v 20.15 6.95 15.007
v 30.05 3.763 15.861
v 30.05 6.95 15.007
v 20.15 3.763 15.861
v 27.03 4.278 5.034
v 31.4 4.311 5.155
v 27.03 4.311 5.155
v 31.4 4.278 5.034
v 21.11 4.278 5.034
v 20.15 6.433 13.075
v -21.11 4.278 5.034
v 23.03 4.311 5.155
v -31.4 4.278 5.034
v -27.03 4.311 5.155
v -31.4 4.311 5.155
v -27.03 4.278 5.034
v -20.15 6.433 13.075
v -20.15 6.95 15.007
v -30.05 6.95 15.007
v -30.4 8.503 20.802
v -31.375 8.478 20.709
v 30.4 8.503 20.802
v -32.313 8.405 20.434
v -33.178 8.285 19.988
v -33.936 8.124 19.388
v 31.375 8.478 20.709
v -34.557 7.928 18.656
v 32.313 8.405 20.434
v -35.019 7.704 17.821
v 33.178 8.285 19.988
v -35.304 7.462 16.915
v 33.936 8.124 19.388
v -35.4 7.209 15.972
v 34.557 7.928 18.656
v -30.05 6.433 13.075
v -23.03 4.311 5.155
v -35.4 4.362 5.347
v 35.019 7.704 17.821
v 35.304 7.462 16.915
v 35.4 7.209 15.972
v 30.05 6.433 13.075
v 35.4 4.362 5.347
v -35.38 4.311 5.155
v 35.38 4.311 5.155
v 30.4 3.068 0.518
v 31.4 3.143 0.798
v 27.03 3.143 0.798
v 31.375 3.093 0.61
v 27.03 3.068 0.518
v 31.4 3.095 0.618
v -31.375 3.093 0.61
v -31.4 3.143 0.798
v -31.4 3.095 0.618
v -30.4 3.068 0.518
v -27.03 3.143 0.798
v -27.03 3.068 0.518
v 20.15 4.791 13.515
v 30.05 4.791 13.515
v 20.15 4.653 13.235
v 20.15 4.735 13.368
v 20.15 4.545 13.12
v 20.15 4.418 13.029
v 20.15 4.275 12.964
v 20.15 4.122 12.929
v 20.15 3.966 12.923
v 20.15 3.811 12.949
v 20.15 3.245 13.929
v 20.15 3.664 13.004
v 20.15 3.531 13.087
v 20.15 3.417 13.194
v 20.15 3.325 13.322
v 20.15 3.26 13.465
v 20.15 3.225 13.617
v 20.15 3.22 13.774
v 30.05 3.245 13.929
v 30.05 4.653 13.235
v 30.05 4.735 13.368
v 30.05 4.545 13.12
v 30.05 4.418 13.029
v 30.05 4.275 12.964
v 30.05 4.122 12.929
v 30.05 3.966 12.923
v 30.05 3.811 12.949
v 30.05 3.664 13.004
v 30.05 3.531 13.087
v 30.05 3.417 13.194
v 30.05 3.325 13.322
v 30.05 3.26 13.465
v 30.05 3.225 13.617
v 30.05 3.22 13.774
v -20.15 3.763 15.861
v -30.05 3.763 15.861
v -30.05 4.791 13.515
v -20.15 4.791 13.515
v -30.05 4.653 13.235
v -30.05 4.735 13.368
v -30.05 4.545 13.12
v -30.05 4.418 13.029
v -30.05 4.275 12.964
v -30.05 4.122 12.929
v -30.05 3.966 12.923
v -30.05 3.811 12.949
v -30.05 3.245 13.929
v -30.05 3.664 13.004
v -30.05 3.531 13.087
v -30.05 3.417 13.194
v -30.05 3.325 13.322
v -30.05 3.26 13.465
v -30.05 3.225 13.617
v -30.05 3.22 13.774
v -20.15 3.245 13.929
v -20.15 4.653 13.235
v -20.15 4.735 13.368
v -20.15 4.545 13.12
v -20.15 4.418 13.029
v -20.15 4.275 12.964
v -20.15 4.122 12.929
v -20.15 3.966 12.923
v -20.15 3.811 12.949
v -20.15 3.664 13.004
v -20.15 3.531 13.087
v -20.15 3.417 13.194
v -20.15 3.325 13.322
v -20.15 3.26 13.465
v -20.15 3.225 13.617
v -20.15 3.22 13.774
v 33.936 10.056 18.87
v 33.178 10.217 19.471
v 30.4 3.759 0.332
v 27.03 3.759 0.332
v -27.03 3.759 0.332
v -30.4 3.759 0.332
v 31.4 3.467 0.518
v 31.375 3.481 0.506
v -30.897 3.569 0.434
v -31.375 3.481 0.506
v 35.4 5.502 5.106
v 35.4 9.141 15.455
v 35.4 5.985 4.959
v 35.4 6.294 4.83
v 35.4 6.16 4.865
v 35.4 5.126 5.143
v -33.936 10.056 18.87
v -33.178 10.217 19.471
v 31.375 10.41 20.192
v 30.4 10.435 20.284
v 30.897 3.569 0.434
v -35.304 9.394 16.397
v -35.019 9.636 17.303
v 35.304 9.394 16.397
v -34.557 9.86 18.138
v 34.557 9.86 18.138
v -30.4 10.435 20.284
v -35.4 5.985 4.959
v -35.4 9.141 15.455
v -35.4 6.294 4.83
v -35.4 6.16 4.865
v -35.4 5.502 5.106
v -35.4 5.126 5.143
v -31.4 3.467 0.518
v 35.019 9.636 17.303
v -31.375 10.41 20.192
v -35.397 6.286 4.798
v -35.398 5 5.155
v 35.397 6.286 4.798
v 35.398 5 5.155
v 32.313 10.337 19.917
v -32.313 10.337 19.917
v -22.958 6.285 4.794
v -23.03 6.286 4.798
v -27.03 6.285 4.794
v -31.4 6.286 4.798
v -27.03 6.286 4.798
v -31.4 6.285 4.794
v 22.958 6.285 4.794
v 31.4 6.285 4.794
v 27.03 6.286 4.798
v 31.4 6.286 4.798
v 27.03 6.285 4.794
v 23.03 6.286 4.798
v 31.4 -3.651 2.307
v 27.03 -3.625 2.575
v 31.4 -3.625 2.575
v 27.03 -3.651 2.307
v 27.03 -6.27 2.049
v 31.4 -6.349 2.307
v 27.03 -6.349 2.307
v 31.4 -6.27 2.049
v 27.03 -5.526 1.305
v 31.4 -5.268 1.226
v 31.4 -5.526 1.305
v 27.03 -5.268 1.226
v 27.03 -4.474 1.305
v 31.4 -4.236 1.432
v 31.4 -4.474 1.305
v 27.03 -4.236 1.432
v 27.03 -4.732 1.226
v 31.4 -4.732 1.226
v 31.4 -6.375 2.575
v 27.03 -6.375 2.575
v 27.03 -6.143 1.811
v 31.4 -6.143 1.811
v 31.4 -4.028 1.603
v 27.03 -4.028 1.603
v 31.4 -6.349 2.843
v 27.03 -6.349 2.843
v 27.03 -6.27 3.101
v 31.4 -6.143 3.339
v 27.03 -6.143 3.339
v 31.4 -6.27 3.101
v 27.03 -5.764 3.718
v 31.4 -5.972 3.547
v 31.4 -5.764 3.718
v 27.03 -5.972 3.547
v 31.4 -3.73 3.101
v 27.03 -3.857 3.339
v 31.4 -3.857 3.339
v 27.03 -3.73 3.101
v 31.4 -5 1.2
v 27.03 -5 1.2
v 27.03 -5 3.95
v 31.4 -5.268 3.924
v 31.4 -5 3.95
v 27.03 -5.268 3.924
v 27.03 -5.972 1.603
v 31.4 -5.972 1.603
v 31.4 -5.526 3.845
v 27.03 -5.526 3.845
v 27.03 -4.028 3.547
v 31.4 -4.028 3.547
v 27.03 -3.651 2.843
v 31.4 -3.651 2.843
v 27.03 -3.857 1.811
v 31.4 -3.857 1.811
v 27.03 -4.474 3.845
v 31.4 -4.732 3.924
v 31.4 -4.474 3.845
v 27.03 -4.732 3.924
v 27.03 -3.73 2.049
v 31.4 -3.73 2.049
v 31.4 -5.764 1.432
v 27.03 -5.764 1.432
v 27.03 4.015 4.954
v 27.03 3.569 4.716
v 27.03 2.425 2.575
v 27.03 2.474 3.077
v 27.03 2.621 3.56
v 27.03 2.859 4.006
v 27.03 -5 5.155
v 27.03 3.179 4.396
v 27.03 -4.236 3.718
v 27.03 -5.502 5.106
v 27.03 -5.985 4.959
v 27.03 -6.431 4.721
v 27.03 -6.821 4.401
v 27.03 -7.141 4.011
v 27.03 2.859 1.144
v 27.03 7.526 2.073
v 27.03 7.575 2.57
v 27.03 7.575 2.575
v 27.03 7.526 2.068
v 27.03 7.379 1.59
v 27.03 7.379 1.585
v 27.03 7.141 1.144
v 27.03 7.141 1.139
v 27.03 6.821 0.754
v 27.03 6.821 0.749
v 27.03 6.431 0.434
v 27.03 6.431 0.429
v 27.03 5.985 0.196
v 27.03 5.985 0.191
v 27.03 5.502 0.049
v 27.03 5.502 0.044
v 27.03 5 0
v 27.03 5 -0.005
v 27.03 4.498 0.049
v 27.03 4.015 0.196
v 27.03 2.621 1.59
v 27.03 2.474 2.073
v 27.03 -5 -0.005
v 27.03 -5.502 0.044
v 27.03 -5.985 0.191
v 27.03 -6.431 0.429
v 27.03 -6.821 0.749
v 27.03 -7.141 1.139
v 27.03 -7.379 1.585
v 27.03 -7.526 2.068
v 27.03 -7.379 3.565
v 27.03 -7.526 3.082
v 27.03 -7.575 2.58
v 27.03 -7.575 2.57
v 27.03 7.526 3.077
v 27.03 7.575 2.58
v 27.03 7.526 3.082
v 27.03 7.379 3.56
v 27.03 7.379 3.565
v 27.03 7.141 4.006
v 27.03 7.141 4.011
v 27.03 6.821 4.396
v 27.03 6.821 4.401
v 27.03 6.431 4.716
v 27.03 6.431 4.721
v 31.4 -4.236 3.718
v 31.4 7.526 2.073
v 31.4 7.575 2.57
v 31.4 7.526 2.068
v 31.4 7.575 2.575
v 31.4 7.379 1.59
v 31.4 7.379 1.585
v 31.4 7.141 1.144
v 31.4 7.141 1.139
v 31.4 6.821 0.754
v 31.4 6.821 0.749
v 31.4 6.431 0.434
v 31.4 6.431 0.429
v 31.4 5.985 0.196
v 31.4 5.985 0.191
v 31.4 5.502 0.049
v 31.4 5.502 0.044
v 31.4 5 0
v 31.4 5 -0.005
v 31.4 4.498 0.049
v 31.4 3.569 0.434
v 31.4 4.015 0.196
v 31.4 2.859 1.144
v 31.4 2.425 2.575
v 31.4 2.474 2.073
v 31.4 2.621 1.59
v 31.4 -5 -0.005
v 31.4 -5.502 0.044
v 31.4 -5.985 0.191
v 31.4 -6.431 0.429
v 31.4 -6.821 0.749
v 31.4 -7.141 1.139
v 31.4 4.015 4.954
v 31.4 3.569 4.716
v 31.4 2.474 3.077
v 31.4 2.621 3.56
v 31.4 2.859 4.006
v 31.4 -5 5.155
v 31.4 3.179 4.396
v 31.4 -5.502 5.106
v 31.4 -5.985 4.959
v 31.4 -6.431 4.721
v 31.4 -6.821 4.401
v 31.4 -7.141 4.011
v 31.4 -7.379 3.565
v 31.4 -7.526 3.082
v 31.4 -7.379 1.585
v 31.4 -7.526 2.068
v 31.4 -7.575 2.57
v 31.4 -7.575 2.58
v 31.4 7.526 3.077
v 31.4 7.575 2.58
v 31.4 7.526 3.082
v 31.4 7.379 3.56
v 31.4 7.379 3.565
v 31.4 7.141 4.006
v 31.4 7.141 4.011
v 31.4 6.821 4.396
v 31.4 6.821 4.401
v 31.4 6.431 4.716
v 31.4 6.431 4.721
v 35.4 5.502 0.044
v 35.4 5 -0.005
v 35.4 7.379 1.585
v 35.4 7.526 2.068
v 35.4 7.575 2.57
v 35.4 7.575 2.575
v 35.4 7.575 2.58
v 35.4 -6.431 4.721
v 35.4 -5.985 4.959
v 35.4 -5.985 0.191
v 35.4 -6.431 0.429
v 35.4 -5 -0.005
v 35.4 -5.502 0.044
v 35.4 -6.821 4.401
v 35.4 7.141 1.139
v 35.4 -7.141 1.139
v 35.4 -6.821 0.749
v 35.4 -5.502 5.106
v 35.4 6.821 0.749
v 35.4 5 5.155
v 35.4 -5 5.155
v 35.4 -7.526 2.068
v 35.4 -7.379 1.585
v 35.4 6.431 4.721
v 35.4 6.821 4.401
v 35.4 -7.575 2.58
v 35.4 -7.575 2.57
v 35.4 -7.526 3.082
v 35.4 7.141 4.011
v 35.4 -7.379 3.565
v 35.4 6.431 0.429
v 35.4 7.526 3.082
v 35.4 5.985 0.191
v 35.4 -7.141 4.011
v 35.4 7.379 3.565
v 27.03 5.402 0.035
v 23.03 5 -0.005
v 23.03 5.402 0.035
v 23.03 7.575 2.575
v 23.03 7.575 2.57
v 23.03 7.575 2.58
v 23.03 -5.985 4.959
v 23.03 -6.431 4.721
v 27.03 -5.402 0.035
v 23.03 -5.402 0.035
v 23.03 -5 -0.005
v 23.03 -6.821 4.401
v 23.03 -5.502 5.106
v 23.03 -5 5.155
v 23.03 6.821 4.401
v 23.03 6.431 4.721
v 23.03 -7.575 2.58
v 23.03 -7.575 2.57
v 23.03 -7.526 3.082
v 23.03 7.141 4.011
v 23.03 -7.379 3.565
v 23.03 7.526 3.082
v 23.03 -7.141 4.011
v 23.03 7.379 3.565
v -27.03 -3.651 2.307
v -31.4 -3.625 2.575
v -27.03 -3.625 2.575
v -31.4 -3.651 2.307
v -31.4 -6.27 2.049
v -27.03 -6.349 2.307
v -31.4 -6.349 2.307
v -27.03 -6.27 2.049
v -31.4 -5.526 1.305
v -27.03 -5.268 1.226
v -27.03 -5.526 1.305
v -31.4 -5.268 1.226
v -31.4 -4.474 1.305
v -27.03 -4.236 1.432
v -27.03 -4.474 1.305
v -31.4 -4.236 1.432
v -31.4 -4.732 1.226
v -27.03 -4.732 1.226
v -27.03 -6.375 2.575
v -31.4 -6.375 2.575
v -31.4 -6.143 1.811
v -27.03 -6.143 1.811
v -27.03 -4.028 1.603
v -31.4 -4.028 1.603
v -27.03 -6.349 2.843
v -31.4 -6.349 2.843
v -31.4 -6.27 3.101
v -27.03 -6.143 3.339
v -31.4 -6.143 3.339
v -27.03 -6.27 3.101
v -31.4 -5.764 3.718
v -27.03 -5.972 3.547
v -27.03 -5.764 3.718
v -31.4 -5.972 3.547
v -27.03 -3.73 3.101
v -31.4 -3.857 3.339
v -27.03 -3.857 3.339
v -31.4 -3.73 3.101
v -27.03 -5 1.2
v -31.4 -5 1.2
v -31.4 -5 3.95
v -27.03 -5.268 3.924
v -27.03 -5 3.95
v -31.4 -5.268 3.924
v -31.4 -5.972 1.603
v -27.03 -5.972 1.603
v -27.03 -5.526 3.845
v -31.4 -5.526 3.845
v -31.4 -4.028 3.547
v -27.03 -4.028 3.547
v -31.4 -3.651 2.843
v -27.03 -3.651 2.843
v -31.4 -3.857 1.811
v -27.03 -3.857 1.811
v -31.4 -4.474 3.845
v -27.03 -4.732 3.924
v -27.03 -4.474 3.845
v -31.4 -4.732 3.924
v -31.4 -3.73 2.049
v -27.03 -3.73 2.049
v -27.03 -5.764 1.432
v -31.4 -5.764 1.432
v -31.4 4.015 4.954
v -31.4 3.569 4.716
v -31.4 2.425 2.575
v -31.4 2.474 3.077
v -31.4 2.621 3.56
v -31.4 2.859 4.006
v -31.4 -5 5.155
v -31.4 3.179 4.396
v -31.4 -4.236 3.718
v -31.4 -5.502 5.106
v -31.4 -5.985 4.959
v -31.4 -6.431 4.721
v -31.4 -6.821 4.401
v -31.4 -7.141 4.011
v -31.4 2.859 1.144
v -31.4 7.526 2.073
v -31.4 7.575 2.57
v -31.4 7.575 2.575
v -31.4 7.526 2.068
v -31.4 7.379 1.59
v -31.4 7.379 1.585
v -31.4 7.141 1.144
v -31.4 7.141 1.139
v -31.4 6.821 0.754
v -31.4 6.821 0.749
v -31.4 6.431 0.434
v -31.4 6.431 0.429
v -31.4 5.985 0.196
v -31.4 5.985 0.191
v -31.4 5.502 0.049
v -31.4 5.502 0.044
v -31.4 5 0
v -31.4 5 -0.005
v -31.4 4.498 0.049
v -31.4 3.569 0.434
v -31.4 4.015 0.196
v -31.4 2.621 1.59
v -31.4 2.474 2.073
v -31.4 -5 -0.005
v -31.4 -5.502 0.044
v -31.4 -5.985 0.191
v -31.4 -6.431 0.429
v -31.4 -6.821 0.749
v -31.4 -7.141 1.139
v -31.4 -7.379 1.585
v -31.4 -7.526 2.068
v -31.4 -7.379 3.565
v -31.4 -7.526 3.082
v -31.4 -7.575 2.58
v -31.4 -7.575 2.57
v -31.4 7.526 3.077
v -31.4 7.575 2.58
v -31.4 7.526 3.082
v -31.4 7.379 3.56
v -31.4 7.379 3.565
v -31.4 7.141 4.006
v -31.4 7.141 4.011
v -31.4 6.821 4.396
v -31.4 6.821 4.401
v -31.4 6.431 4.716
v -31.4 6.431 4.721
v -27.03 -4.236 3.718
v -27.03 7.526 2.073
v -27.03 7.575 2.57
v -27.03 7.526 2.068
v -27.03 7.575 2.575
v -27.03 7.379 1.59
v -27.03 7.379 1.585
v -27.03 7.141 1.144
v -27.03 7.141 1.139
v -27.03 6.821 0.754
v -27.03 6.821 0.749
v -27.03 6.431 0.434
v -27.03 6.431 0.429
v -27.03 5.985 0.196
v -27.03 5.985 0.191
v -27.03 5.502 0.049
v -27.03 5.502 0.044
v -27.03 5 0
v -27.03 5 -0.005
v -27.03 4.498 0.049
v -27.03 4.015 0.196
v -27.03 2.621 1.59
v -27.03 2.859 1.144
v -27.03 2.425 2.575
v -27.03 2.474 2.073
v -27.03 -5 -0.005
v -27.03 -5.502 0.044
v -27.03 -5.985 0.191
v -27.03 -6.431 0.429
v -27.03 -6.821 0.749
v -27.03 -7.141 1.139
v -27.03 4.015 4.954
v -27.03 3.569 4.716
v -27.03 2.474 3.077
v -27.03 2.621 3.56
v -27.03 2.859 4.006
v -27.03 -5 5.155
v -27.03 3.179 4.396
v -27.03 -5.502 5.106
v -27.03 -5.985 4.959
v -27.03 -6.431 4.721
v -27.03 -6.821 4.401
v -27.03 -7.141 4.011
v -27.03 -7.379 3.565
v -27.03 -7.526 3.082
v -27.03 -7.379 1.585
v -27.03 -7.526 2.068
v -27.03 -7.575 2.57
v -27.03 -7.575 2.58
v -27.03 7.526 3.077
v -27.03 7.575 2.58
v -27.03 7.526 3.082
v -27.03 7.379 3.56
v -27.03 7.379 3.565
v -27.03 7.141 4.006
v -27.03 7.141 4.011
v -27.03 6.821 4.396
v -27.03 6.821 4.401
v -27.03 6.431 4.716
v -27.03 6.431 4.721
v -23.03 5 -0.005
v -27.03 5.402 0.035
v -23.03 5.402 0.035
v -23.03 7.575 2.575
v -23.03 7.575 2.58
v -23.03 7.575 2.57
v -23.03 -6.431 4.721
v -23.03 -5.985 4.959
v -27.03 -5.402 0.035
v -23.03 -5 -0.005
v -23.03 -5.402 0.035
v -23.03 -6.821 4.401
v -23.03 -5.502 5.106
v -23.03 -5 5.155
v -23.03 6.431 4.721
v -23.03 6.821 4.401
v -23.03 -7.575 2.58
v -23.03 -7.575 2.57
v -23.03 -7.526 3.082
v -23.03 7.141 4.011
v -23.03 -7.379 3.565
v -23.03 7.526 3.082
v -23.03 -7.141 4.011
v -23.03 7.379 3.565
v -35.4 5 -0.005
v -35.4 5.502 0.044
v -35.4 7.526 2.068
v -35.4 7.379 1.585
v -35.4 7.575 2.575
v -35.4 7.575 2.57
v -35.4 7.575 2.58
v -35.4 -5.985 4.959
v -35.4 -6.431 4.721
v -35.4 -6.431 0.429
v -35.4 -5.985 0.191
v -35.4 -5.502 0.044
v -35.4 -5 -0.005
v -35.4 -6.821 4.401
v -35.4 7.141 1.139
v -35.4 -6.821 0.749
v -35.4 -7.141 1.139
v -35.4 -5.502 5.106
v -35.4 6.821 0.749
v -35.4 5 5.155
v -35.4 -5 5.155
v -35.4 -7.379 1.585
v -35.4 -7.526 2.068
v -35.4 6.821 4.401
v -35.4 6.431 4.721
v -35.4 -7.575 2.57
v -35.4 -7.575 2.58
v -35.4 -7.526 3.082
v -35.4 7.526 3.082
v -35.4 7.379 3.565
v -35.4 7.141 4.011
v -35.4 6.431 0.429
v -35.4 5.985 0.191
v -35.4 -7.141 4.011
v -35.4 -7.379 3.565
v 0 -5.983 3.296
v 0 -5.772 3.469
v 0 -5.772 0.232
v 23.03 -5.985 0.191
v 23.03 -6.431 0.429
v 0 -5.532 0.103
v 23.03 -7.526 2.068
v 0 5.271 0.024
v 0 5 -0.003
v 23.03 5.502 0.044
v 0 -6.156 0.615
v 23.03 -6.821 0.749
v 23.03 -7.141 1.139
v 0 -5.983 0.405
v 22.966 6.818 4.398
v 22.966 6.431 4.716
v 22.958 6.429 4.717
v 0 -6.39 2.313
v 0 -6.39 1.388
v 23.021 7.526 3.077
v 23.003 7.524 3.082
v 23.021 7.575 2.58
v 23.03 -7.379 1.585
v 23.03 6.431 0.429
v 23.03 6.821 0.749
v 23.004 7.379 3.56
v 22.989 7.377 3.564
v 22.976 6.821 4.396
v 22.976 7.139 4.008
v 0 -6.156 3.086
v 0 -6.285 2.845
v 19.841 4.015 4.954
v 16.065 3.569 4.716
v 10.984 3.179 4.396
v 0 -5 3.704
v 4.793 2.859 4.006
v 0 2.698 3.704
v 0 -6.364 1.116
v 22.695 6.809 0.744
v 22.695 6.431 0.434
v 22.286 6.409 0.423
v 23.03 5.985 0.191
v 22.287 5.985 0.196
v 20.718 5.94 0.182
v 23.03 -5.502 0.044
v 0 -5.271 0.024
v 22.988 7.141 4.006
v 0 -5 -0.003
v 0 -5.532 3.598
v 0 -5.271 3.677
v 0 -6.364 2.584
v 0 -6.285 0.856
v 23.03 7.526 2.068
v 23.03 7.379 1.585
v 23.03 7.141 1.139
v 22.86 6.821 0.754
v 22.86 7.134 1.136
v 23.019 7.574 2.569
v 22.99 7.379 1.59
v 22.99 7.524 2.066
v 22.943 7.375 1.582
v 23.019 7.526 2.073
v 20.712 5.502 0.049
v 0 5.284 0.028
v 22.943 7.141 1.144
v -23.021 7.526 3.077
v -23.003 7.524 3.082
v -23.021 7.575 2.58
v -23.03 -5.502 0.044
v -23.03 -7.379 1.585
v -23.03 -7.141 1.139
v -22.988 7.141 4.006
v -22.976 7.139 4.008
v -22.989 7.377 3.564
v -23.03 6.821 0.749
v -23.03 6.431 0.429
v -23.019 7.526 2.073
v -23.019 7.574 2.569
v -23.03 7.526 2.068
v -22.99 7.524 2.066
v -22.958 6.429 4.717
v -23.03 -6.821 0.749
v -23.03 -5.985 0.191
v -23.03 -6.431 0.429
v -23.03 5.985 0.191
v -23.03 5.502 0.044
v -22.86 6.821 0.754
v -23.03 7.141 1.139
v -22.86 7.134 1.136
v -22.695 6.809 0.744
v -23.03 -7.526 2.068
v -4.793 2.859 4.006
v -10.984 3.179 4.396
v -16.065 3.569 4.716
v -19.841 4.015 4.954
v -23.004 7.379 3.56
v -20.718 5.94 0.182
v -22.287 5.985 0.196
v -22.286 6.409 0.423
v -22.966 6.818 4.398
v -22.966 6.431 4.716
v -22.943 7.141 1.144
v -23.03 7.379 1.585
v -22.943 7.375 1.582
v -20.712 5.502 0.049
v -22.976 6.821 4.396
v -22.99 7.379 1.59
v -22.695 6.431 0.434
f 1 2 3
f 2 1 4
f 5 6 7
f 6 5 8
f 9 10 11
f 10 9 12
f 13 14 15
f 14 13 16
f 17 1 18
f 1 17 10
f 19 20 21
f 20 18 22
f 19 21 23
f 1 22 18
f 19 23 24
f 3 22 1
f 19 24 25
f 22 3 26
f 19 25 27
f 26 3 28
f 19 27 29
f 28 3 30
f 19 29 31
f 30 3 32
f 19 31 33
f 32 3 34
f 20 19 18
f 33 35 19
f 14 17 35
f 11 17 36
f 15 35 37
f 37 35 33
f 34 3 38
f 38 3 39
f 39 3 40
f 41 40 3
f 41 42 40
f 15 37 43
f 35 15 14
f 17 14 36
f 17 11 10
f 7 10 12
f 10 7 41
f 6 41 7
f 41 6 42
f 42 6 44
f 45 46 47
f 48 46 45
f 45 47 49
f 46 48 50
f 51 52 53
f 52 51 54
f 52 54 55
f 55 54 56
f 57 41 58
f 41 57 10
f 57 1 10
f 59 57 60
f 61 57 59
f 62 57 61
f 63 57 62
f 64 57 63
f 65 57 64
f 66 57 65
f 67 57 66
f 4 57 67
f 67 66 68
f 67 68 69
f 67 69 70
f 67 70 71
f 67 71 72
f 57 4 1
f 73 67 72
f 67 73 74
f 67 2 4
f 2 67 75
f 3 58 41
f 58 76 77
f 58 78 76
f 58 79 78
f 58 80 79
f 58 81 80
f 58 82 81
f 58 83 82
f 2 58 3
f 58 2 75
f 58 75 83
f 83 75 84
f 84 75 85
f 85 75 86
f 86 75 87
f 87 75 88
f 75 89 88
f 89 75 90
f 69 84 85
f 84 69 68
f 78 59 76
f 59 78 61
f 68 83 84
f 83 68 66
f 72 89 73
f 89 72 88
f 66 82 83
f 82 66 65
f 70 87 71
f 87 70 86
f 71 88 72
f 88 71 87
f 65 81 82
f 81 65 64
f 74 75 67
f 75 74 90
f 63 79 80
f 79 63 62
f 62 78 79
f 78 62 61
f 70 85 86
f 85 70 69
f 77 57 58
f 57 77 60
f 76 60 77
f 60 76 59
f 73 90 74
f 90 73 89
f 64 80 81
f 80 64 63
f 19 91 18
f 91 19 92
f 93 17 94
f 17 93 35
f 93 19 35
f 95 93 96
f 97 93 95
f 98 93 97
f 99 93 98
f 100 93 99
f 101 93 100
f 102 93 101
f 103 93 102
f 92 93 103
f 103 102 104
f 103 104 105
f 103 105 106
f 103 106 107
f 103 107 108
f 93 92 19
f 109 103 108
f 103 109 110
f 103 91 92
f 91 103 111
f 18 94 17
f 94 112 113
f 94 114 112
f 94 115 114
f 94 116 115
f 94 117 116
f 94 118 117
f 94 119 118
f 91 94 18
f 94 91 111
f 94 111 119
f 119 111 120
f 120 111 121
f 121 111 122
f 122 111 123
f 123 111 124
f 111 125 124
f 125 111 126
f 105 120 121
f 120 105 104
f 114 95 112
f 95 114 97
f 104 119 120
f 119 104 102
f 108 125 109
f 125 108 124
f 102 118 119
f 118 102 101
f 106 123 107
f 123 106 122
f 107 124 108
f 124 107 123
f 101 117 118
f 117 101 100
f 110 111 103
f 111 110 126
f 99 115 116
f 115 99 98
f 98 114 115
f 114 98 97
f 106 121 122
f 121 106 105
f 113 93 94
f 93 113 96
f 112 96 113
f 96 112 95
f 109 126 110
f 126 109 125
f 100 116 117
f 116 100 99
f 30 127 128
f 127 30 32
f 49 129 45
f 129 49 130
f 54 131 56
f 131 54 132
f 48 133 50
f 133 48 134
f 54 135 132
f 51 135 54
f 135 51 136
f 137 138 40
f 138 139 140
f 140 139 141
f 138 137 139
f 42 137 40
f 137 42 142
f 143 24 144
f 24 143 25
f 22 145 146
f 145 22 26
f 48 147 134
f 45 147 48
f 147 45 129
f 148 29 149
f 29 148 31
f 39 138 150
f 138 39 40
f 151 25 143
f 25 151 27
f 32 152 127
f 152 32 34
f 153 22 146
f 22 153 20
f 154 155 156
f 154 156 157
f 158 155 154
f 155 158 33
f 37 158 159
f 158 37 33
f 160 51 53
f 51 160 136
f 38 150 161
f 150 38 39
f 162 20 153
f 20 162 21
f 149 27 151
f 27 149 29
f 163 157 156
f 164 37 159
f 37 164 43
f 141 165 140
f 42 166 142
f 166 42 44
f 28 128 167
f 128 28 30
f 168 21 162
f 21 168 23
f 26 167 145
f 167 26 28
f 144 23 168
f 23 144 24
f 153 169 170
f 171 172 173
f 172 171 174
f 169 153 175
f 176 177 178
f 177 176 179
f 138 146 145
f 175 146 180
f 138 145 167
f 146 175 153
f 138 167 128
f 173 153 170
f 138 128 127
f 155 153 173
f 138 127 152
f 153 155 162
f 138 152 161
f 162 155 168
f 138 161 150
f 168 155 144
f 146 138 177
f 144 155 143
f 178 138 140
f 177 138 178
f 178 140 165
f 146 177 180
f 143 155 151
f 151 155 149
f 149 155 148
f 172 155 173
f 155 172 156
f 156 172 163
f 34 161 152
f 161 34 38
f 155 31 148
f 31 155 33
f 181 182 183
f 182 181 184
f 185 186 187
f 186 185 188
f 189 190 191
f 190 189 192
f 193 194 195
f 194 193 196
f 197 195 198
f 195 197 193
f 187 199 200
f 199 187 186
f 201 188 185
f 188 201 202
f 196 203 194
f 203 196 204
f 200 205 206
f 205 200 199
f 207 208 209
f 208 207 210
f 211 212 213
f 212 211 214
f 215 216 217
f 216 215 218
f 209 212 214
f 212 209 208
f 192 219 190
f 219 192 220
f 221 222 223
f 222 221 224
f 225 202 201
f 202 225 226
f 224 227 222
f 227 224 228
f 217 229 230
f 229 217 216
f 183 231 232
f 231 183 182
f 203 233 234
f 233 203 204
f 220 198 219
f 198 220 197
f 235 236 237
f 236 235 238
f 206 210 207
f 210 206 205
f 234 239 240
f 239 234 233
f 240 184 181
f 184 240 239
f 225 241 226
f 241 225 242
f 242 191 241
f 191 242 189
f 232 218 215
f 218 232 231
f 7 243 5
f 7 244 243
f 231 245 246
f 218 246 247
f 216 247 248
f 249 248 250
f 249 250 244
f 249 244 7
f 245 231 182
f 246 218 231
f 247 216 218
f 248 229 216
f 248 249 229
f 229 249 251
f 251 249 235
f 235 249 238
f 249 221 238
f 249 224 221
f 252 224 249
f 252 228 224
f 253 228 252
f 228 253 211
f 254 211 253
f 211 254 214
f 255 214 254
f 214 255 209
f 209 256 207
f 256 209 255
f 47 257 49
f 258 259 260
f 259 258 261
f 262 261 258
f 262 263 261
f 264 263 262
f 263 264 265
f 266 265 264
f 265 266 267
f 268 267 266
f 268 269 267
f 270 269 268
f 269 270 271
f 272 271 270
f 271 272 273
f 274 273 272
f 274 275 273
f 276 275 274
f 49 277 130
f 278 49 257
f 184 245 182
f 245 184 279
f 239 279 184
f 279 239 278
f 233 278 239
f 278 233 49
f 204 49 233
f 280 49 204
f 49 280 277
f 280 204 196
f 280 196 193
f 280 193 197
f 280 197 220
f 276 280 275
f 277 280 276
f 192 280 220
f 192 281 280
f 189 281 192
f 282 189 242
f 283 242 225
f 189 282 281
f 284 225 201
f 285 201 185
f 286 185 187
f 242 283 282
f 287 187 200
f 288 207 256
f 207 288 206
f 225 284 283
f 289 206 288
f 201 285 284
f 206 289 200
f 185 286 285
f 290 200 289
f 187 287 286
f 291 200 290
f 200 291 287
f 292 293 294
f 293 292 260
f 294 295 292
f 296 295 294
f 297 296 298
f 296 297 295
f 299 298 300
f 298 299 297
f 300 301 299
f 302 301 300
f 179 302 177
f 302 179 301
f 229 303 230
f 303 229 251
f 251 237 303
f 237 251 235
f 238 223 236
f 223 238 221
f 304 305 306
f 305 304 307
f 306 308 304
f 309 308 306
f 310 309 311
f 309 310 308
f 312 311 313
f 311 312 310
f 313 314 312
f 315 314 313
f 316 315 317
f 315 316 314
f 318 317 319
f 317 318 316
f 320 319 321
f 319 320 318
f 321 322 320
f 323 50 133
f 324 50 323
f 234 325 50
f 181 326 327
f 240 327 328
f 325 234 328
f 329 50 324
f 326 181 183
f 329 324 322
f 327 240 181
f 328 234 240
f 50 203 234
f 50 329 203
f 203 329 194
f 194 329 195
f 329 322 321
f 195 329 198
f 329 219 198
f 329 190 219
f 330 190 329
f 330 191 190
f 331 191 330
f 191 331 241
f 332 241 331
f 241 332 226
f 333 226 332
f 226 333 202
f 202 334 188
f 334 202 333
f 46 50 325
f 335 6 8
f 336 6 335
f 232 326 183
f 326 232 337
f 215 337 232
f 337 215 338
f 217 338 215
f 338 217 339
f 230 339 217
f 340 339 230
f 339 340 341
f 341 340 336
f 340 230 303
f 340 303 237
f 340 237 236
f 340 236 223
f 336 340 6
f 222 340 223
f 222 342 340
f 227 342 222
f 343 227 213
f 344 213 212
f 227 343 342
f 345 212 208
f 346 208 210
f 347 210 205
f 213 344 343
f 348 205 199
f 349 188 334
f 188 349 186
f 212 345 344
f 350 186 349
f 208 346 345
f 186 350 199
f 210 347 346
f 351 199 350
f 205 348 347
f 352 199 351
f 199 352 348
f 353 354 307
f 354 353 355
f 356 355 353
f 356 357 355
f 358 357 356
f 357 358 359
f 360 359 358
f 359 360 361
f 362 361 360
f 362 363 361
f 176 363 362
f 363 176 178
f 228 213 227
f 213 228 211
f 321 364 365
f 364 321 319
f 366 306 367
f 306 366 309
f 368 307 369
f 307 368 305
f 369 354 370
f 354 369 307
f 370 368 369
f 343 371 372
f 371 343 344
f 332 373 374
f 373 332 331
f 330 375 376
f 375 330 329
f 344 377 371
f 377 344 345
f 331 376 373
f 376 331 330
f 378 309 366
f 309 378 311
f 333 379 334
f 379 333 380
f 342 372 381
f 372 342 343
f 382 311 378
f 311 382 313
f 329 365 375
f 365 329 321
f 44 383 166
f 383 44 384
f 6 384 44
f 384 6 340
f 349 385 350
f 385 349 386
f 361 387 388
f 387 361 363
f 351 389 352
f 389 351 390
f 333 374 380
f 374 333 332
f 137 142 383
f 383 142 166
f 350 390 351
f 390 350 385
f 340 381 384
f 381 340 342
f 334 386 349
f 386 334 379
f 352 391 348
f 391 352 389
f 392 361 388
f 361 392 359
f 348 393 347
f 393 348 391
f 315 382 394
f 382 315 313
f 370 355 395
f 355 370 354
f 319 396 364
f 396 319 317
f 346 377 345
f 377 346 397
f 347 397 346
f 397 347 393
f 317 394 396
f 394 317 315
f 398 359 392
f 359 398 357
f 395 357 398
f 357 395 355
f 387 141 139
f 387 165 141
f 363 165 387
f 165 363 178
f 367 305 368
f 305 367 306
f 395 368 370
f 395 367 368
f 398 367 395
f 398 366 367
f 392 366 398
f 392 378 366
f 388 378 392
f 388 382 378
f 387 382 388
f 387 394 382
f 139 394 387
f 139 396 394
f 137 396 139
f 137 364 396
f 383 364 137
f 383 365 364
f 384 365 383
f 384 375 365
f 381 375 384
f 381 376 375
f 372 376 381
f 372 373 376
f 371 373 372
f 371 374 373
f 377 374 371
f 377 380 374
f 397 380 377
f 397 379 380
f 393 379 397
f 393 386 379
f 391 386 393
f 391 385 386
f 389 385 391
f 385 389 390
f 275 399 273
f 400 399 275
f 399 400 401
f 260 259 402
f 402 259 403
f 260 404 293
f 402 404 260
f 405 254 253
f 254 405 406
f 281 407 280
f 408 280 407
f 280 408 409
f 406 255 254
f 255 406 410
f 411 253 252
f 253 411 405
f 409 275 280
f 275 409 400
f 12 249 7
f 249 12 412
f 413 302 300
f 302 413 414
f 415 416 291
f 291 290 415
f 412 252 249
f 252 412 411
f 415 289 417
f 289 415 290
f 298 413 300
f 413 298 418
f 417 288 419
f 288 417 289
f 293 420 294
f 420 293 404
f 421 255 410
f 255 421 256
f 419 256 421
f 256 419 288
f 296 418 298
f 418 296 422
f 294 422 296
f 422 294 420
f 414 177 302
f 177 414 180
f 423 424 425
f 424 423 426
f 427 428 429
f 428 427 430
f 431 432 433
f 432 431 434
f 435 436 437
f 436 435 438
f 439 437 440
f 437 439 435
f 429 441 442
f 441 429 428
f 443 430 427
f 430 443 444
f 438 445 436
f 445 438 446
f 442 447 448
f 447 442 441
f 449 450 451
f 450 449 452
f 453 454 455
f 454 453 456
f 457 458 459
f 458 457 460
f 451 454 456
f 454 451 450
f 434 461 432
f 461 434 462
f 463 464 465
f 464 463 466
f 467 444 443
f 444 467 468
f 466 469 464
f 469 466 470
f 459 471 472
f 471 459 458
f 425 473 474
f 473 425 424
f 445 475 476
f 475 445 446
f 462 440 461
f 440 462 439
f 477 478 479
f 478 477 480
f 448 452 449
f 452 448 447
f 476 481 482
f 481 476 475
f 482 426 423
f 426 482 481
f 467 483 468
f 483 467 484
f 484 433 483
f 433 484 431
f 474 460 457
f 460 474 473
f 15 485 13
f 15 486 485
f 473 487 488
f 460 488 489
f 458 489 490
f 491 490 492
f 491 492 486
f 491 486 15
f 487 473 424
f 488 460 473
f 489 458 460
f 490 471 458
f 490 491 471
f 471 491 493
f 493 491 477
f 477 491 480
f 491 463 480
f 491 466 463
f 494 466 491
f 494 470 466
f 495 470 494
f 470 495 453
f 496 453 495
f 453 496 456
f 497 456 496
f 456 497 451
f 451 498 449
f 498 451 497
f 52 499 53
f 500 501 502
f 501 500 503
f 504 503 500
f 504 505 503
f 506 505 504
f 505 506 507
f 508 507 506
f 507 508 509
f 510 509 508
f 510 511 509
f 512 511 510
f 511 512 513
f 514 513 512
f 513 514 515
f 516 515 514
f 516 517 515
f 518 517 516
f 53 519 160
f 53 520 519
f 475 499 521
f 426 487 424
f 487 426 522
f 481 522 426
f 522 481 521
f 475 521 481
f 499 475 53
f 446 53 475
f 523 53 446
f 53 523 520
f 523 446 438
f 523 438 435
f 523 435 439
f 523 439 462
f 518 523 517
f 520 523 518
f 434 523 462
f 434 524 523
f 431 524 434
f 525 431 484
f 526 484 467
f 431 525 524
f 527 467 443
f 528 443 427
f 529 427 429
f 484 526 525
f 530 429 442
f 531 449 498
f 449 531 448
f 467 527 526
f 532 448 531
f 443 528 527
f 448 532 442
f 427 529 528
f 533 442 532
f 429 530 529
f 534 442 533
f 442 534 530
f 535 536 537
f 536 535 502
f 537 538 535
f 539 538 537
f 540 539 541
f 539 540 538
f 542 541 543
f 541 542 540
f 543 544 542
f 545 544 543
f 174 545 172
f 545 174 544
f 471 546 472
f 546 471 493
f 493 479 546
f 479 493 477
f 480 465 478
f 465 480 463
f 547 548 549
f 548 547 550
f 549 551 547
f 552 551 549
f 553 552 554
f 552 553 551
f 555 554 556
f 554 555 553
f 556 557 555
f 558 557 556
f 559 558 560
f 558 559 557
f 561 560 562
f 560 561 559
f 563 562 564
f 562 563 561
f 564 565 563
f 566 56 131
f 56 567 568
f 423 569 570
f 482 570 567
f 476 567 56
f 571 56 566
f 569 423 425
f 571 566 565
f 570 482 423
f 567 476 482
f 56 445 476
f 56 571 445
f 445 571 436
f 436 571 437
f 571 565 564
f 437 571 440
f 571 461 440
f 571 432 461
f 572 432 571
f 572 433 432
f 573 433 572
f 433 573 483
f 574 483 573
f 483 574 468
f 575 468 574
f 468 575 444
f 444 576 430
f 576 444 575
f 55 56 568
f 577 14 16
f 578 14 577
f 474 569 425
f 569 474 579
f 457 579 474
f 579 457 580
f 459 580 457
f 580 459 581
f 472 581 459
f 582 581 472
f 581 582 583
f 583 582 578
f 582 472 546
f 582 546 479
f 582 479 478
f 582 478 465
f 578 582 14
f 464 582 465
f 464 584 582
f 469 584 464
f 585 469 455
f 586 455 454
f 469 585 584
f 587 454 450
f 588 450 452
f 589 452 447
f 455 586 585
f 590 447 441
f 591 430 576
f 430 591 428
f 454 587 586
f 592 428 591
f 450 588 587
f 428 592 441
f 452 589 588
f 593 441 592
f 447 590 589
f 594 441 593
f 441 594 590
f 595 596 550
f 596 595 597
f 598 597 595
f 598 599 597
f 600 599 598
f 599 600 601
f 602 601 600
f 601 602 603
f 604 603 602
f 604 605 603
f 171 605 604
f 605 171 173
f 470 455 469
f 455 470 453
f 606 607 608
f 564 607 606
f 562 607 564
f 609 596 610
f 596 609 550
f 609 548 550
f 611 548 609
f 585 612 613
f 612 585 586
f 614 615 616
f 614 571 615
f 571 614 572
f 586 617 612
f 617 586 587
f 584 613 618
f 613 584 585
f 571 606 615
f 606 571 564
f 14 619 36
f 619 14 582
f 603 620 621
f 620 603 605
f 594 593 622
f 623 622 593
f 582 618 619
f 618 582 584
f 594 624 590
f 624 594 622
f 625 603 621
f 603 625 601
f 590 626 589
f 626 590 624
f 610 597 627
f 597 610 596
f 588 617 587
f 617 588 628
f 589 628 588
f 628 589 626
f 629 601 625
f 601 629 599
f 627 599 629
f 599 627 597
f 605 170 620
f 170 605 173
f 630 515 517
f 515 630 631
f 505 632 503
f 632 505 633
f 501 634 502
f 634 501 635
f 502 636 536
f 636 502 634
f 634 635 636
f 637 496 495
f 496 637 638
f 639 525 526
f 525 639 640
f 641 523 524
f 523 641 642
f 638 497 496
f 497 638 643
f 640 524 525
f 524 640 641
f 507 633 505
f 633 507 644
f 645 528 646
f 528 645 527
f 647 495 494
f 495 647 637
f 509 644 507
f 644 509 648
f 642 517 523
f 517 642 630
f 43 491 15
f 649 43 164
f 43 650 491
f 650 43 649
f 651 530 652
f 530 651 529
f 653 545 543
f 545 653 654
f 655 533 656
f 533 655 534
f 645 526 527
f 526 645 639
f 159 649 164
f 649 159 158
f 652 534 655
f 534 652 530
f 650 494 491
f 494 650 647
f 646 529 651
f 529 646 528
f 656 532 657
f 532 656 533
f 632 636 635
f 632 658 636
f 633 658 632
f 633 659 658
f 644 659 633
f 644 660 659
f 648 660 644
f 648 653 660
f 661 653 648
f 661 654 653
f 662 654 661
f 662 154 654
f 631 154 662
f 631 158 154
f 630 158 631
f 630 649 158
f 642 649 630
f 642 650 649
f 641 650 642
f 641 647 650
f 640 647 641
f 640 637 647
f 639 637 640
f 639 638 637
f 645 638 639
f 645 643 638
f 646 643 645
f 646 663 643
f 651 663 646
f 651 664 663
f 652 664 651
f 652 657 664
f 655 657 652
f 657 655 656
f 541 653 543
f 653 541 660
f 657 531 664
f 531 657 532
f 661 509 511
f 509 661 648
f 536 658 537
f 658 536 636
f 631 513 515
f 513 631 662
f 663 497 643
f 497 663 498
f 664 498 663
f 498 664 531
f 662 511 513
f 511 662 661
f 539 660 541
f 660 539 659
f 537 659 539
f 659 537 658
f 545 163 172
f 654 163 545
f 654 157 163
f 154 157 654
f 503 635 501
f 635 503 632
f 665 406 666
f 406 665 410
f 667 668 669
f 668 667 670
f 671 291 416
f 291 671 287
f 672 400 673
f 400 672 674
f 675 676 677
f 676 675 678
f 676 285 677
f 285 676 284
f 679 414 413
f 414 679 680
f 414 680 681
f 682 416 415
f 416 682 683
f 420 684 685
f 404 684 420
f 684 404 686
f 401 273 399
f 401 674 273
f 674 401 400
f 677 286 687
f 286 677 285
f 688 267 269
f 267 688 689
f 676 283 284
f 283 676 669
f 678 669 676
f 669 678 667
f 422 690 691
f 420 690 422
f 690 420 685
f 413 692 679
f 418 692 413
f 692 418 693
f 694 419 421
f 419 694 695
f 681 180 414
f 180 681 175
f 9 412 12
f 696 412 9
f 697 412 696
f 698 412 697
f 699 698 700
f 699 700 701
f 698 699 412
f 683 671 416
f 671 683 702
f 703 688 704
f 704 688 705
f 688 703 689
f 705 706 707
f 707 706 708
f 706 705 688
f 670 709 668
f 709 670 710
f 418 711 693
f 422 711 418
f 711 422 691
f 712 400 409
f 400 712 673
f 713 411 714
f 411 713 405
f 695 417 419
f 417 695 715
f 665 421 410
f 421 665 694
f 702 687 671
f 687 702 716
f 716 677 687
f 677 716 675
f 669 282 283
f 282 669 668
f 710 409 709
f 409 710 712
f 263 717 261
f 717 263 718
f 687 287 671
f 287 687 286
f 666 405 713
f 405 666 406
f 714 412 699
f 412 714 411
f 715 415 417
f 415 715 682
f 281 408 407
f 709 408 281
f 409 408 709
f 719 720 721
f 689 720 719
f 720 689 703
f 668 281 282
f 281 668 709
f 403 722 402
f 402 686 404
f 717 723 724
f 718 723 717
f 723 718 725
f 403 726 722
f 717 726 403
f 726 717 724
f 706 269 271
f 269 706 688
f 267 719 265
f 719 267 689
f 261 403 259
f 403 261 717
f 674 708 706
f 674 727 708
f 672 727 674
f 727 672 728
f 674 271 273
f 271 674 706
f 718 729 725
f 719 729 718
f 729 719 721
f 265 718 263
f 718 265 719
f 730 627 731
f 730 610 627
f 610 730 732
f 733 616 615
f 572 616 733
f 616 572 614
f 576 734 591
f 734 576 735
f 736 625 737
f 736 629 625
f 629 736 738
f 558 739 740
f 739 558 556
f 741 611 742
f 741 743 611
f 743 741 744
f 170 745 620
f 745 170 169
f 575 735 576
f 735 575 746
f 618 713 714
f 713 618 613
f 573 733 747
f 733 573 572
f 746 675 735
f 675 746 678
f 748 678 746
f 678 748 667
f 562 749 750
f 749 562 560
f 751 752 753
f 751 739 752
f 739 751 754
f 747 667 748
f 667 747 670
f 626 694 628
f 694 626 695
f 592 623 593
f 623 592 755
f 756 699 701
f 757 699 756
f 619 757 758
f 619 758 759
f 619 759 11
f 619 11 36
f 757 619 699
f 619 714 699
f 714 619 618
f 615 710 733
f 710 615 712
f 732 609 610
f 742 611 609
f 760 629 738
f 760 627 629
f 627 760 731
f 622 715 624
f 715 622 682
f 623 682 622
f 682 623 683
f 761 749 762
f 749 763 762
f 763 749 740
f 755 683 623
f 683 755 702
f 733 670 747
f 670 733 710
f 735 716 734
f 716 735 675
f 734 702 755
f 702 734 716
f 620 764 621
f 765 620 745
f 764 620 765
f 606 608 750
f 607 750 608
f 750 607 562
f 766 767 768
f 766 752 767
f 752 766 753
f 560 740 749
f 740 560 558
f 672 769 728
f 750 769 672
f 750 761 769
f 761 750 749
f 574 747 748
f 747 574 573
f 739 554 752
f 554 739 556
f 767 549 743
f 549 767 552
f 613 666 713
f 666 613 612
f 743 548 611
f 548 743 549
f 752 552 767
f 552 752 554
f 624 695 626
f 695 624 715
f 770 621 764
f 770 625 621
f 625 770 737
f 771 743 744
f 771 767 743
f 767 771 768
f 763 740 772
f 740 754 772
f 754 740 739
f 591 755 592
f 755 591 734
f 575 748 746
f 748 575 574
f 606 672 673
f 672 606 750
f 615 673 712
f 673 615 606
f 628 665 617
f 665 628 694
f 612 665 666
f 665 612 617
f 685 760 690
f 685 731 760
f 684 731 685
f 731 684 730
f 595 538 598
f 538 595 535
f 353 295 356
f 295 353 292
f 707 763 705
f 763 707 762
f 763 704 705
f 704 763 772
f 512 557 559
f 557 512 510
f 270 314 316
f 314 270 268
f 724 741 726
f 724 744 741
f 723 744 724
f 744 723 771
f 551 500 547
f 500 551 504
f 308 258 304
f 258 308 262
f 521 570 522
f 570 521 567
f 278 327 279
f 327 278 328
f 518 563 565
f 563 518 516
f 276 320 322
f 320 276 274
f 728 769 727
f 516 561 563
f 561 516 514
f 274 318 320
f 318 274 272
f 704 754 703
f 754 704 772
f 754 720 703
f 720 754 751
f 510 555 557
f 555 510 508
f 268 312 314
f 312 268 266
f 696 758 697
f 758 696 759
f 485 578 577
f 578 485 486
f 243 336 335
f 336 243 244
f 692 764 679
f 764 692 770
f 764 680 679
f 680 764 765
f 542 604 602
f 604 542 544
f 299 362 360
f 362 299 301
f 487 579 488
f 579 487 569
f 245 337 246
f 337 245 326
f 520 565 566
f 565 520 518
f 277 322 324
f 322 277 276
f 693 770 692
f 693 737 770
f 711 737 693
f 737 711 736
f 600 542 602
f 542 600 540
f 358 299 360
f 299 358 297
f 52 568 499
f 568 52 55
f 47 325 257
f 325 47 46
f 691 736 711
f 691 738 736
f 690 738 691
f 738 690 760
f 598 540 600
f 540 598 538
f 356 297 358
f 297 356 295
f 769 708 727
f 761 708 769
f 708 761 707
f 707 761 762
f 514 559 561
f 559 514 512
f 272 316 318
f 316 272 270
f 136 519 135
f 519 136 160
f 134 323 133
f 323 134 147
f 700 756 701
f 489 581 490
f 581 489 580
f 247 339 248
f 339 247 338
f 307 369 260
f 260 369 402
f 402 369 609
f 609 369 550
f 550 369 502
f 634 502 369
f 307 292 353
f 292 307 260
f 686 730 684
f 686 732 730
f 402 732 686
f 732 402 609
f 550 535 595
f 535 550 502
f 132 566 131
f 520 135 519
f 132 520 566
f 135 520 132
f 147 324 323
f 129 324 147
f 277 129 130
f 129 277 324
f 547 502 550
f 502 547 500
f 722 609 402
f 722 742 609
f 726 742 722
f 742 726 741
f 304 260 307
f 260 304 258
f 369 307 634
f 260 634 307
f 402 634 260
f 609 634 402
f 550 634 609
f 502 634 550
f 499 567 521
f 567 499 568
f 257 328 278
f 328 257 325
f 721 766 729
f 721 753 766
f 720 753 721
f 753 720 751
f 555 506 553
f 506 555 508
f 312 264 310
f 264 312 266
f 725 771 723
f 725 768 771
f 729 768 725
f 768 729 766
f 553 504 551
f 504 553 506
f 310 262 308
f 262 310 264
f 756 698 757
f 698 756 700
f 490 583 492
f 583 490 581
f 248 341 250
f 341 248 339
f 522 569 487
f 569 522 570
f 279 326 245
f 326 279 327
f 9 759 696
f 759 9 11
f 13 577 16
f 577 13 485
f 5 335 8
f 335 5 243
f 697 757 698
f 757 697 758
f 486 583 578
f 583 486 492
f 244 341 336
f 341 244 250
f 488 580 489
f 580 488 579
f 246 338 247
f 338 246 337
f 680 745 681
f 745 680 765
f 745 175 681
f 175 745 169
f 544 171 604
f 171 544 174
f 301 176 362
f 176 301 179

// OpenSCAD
// Sandwich Container Clamp

$fn = 32;

connection_bar_dia = 2.75;
connection_bar_len = 4.37;
connection_bar_dist = 54.06; // From their closest ends
connection_bar_outline_dia = 5.15;
connection_bar_outer_thick = 4.0;

rounding = 5;
plate_thick = 2.0;
plate_angle = 75; // Degrees from bottom plate to back plate
bottom_plate_wid = 10.0;
bottom_plate_len = connection_bar_dist;
top_plate_len = connection_bar_dist + 2*connection_bar_len + 2*connection_bar_outer_thick;
top_plate_wid = 21.0;

clip_bottom_dist = 12.5; // Distance from bottom plate to clip that grabs the top of the container
clip_bump_dia = 0.4*2; // The semicircle bump that snaps it in
clip_len = 9.9;
clip_wid = 3.3;
clip_dist = 40.3;

module bottomPlate() {
    linear_extrude(plate_thick)
    square([bottom_plate_len, bottom_plate_wid], center=true);
}

module clipTab() {
    translate([0,0,plate_thick])
    rotate([90,-90,0])
    union() {
        translate([clip_wid/2,0,-plate_thick/2]) {
            linear_extrude(plate_thick)
            square([clip_wid, clip_len], center=true);
        }
        rotate([90,0,0])
        translate([clip_wid-clip_bump_dia,plate_thick/2,-clip_len/2])
        linear_extrude(clip_len)
        circle(d=clip_bump_dia*2);
    }
}

module topPlate() {
    translate([0,bottom_plate_wid/2,0])
    rotate([plate_angle,0,0])
    translate([0,top_plate_wid/2,0]) {
        linear_extrude(plate_thick)
        offset(rounding) offset(-rounding)
        square([top_plate_len, top_plate_wid], center=true);
        translate([clip_dist/2+clip_len/2,clip_bottom_dist-bottom_plate_wid+plate_thick/2,0])
        clipTab();
        translate([-clip_dist/2-clip_len/2,clip_bottom_dist-bottom_plate_wid+plate_thick/2,0])
        clipTab();
    }
}

module connectionBar(one_side=false) {
    translate([0,0,connection_bar_outline_dia/2])
    rotate([90,0,90])
    translate([0,0,-connection_bar_len/2-connection_bar_outer_thick])
    union() {
        linear_extrude(connection_bar_outer_thick)
        offset(connection_bar_outline_dia/2)
        square([bottom_plate_wid, 0.01], center=true);
        
        if (!one_side) {
        translate([-bottom_plate_wid/2,0,connection_bar_outer_thick])
        linear_extrude(connection_bar_len)
        circle(d=connection_bar_dia);
        
        translate([0,0,connection_bar_outer_thick+connection_bar_len])
        linear_extrude(connection_bar_outer_thick)
        offset(connection_bar_outline_dia/2)
        square([bottom_plate_wid, 0.01], center=true);
        }
    }
}

module finalClamp() {
    topPlate();
    hull() {
        bottomPlate();
        translate([connection_bar_dist/2+connection_bar_len/2,0,0])
        connectionBar(true);
    }
    hull() {
        bottomPlate();
        translate([-(connection_bar_dist/2+connection_bar_len/2),0,0])
        rotate([0,0,180])
        connectionBar(true);
    }
    translate([connection_bar_dist/2+connection_bar_len/2,0,0])
    connectionBar();
    translate([-(connection_bar_dist/2+connection_bar_len/2),0,0])
    connectionBar();
    translate([0,bottom_plate_wid/2,connection_bar_outline_dia/2])
    rotate([0,90,0])
    translate([0,0,-top_plate_len/2])
    cylinder(d=connection_bar_outline_dia, h=top_plate_len);
}

finalClamp();
